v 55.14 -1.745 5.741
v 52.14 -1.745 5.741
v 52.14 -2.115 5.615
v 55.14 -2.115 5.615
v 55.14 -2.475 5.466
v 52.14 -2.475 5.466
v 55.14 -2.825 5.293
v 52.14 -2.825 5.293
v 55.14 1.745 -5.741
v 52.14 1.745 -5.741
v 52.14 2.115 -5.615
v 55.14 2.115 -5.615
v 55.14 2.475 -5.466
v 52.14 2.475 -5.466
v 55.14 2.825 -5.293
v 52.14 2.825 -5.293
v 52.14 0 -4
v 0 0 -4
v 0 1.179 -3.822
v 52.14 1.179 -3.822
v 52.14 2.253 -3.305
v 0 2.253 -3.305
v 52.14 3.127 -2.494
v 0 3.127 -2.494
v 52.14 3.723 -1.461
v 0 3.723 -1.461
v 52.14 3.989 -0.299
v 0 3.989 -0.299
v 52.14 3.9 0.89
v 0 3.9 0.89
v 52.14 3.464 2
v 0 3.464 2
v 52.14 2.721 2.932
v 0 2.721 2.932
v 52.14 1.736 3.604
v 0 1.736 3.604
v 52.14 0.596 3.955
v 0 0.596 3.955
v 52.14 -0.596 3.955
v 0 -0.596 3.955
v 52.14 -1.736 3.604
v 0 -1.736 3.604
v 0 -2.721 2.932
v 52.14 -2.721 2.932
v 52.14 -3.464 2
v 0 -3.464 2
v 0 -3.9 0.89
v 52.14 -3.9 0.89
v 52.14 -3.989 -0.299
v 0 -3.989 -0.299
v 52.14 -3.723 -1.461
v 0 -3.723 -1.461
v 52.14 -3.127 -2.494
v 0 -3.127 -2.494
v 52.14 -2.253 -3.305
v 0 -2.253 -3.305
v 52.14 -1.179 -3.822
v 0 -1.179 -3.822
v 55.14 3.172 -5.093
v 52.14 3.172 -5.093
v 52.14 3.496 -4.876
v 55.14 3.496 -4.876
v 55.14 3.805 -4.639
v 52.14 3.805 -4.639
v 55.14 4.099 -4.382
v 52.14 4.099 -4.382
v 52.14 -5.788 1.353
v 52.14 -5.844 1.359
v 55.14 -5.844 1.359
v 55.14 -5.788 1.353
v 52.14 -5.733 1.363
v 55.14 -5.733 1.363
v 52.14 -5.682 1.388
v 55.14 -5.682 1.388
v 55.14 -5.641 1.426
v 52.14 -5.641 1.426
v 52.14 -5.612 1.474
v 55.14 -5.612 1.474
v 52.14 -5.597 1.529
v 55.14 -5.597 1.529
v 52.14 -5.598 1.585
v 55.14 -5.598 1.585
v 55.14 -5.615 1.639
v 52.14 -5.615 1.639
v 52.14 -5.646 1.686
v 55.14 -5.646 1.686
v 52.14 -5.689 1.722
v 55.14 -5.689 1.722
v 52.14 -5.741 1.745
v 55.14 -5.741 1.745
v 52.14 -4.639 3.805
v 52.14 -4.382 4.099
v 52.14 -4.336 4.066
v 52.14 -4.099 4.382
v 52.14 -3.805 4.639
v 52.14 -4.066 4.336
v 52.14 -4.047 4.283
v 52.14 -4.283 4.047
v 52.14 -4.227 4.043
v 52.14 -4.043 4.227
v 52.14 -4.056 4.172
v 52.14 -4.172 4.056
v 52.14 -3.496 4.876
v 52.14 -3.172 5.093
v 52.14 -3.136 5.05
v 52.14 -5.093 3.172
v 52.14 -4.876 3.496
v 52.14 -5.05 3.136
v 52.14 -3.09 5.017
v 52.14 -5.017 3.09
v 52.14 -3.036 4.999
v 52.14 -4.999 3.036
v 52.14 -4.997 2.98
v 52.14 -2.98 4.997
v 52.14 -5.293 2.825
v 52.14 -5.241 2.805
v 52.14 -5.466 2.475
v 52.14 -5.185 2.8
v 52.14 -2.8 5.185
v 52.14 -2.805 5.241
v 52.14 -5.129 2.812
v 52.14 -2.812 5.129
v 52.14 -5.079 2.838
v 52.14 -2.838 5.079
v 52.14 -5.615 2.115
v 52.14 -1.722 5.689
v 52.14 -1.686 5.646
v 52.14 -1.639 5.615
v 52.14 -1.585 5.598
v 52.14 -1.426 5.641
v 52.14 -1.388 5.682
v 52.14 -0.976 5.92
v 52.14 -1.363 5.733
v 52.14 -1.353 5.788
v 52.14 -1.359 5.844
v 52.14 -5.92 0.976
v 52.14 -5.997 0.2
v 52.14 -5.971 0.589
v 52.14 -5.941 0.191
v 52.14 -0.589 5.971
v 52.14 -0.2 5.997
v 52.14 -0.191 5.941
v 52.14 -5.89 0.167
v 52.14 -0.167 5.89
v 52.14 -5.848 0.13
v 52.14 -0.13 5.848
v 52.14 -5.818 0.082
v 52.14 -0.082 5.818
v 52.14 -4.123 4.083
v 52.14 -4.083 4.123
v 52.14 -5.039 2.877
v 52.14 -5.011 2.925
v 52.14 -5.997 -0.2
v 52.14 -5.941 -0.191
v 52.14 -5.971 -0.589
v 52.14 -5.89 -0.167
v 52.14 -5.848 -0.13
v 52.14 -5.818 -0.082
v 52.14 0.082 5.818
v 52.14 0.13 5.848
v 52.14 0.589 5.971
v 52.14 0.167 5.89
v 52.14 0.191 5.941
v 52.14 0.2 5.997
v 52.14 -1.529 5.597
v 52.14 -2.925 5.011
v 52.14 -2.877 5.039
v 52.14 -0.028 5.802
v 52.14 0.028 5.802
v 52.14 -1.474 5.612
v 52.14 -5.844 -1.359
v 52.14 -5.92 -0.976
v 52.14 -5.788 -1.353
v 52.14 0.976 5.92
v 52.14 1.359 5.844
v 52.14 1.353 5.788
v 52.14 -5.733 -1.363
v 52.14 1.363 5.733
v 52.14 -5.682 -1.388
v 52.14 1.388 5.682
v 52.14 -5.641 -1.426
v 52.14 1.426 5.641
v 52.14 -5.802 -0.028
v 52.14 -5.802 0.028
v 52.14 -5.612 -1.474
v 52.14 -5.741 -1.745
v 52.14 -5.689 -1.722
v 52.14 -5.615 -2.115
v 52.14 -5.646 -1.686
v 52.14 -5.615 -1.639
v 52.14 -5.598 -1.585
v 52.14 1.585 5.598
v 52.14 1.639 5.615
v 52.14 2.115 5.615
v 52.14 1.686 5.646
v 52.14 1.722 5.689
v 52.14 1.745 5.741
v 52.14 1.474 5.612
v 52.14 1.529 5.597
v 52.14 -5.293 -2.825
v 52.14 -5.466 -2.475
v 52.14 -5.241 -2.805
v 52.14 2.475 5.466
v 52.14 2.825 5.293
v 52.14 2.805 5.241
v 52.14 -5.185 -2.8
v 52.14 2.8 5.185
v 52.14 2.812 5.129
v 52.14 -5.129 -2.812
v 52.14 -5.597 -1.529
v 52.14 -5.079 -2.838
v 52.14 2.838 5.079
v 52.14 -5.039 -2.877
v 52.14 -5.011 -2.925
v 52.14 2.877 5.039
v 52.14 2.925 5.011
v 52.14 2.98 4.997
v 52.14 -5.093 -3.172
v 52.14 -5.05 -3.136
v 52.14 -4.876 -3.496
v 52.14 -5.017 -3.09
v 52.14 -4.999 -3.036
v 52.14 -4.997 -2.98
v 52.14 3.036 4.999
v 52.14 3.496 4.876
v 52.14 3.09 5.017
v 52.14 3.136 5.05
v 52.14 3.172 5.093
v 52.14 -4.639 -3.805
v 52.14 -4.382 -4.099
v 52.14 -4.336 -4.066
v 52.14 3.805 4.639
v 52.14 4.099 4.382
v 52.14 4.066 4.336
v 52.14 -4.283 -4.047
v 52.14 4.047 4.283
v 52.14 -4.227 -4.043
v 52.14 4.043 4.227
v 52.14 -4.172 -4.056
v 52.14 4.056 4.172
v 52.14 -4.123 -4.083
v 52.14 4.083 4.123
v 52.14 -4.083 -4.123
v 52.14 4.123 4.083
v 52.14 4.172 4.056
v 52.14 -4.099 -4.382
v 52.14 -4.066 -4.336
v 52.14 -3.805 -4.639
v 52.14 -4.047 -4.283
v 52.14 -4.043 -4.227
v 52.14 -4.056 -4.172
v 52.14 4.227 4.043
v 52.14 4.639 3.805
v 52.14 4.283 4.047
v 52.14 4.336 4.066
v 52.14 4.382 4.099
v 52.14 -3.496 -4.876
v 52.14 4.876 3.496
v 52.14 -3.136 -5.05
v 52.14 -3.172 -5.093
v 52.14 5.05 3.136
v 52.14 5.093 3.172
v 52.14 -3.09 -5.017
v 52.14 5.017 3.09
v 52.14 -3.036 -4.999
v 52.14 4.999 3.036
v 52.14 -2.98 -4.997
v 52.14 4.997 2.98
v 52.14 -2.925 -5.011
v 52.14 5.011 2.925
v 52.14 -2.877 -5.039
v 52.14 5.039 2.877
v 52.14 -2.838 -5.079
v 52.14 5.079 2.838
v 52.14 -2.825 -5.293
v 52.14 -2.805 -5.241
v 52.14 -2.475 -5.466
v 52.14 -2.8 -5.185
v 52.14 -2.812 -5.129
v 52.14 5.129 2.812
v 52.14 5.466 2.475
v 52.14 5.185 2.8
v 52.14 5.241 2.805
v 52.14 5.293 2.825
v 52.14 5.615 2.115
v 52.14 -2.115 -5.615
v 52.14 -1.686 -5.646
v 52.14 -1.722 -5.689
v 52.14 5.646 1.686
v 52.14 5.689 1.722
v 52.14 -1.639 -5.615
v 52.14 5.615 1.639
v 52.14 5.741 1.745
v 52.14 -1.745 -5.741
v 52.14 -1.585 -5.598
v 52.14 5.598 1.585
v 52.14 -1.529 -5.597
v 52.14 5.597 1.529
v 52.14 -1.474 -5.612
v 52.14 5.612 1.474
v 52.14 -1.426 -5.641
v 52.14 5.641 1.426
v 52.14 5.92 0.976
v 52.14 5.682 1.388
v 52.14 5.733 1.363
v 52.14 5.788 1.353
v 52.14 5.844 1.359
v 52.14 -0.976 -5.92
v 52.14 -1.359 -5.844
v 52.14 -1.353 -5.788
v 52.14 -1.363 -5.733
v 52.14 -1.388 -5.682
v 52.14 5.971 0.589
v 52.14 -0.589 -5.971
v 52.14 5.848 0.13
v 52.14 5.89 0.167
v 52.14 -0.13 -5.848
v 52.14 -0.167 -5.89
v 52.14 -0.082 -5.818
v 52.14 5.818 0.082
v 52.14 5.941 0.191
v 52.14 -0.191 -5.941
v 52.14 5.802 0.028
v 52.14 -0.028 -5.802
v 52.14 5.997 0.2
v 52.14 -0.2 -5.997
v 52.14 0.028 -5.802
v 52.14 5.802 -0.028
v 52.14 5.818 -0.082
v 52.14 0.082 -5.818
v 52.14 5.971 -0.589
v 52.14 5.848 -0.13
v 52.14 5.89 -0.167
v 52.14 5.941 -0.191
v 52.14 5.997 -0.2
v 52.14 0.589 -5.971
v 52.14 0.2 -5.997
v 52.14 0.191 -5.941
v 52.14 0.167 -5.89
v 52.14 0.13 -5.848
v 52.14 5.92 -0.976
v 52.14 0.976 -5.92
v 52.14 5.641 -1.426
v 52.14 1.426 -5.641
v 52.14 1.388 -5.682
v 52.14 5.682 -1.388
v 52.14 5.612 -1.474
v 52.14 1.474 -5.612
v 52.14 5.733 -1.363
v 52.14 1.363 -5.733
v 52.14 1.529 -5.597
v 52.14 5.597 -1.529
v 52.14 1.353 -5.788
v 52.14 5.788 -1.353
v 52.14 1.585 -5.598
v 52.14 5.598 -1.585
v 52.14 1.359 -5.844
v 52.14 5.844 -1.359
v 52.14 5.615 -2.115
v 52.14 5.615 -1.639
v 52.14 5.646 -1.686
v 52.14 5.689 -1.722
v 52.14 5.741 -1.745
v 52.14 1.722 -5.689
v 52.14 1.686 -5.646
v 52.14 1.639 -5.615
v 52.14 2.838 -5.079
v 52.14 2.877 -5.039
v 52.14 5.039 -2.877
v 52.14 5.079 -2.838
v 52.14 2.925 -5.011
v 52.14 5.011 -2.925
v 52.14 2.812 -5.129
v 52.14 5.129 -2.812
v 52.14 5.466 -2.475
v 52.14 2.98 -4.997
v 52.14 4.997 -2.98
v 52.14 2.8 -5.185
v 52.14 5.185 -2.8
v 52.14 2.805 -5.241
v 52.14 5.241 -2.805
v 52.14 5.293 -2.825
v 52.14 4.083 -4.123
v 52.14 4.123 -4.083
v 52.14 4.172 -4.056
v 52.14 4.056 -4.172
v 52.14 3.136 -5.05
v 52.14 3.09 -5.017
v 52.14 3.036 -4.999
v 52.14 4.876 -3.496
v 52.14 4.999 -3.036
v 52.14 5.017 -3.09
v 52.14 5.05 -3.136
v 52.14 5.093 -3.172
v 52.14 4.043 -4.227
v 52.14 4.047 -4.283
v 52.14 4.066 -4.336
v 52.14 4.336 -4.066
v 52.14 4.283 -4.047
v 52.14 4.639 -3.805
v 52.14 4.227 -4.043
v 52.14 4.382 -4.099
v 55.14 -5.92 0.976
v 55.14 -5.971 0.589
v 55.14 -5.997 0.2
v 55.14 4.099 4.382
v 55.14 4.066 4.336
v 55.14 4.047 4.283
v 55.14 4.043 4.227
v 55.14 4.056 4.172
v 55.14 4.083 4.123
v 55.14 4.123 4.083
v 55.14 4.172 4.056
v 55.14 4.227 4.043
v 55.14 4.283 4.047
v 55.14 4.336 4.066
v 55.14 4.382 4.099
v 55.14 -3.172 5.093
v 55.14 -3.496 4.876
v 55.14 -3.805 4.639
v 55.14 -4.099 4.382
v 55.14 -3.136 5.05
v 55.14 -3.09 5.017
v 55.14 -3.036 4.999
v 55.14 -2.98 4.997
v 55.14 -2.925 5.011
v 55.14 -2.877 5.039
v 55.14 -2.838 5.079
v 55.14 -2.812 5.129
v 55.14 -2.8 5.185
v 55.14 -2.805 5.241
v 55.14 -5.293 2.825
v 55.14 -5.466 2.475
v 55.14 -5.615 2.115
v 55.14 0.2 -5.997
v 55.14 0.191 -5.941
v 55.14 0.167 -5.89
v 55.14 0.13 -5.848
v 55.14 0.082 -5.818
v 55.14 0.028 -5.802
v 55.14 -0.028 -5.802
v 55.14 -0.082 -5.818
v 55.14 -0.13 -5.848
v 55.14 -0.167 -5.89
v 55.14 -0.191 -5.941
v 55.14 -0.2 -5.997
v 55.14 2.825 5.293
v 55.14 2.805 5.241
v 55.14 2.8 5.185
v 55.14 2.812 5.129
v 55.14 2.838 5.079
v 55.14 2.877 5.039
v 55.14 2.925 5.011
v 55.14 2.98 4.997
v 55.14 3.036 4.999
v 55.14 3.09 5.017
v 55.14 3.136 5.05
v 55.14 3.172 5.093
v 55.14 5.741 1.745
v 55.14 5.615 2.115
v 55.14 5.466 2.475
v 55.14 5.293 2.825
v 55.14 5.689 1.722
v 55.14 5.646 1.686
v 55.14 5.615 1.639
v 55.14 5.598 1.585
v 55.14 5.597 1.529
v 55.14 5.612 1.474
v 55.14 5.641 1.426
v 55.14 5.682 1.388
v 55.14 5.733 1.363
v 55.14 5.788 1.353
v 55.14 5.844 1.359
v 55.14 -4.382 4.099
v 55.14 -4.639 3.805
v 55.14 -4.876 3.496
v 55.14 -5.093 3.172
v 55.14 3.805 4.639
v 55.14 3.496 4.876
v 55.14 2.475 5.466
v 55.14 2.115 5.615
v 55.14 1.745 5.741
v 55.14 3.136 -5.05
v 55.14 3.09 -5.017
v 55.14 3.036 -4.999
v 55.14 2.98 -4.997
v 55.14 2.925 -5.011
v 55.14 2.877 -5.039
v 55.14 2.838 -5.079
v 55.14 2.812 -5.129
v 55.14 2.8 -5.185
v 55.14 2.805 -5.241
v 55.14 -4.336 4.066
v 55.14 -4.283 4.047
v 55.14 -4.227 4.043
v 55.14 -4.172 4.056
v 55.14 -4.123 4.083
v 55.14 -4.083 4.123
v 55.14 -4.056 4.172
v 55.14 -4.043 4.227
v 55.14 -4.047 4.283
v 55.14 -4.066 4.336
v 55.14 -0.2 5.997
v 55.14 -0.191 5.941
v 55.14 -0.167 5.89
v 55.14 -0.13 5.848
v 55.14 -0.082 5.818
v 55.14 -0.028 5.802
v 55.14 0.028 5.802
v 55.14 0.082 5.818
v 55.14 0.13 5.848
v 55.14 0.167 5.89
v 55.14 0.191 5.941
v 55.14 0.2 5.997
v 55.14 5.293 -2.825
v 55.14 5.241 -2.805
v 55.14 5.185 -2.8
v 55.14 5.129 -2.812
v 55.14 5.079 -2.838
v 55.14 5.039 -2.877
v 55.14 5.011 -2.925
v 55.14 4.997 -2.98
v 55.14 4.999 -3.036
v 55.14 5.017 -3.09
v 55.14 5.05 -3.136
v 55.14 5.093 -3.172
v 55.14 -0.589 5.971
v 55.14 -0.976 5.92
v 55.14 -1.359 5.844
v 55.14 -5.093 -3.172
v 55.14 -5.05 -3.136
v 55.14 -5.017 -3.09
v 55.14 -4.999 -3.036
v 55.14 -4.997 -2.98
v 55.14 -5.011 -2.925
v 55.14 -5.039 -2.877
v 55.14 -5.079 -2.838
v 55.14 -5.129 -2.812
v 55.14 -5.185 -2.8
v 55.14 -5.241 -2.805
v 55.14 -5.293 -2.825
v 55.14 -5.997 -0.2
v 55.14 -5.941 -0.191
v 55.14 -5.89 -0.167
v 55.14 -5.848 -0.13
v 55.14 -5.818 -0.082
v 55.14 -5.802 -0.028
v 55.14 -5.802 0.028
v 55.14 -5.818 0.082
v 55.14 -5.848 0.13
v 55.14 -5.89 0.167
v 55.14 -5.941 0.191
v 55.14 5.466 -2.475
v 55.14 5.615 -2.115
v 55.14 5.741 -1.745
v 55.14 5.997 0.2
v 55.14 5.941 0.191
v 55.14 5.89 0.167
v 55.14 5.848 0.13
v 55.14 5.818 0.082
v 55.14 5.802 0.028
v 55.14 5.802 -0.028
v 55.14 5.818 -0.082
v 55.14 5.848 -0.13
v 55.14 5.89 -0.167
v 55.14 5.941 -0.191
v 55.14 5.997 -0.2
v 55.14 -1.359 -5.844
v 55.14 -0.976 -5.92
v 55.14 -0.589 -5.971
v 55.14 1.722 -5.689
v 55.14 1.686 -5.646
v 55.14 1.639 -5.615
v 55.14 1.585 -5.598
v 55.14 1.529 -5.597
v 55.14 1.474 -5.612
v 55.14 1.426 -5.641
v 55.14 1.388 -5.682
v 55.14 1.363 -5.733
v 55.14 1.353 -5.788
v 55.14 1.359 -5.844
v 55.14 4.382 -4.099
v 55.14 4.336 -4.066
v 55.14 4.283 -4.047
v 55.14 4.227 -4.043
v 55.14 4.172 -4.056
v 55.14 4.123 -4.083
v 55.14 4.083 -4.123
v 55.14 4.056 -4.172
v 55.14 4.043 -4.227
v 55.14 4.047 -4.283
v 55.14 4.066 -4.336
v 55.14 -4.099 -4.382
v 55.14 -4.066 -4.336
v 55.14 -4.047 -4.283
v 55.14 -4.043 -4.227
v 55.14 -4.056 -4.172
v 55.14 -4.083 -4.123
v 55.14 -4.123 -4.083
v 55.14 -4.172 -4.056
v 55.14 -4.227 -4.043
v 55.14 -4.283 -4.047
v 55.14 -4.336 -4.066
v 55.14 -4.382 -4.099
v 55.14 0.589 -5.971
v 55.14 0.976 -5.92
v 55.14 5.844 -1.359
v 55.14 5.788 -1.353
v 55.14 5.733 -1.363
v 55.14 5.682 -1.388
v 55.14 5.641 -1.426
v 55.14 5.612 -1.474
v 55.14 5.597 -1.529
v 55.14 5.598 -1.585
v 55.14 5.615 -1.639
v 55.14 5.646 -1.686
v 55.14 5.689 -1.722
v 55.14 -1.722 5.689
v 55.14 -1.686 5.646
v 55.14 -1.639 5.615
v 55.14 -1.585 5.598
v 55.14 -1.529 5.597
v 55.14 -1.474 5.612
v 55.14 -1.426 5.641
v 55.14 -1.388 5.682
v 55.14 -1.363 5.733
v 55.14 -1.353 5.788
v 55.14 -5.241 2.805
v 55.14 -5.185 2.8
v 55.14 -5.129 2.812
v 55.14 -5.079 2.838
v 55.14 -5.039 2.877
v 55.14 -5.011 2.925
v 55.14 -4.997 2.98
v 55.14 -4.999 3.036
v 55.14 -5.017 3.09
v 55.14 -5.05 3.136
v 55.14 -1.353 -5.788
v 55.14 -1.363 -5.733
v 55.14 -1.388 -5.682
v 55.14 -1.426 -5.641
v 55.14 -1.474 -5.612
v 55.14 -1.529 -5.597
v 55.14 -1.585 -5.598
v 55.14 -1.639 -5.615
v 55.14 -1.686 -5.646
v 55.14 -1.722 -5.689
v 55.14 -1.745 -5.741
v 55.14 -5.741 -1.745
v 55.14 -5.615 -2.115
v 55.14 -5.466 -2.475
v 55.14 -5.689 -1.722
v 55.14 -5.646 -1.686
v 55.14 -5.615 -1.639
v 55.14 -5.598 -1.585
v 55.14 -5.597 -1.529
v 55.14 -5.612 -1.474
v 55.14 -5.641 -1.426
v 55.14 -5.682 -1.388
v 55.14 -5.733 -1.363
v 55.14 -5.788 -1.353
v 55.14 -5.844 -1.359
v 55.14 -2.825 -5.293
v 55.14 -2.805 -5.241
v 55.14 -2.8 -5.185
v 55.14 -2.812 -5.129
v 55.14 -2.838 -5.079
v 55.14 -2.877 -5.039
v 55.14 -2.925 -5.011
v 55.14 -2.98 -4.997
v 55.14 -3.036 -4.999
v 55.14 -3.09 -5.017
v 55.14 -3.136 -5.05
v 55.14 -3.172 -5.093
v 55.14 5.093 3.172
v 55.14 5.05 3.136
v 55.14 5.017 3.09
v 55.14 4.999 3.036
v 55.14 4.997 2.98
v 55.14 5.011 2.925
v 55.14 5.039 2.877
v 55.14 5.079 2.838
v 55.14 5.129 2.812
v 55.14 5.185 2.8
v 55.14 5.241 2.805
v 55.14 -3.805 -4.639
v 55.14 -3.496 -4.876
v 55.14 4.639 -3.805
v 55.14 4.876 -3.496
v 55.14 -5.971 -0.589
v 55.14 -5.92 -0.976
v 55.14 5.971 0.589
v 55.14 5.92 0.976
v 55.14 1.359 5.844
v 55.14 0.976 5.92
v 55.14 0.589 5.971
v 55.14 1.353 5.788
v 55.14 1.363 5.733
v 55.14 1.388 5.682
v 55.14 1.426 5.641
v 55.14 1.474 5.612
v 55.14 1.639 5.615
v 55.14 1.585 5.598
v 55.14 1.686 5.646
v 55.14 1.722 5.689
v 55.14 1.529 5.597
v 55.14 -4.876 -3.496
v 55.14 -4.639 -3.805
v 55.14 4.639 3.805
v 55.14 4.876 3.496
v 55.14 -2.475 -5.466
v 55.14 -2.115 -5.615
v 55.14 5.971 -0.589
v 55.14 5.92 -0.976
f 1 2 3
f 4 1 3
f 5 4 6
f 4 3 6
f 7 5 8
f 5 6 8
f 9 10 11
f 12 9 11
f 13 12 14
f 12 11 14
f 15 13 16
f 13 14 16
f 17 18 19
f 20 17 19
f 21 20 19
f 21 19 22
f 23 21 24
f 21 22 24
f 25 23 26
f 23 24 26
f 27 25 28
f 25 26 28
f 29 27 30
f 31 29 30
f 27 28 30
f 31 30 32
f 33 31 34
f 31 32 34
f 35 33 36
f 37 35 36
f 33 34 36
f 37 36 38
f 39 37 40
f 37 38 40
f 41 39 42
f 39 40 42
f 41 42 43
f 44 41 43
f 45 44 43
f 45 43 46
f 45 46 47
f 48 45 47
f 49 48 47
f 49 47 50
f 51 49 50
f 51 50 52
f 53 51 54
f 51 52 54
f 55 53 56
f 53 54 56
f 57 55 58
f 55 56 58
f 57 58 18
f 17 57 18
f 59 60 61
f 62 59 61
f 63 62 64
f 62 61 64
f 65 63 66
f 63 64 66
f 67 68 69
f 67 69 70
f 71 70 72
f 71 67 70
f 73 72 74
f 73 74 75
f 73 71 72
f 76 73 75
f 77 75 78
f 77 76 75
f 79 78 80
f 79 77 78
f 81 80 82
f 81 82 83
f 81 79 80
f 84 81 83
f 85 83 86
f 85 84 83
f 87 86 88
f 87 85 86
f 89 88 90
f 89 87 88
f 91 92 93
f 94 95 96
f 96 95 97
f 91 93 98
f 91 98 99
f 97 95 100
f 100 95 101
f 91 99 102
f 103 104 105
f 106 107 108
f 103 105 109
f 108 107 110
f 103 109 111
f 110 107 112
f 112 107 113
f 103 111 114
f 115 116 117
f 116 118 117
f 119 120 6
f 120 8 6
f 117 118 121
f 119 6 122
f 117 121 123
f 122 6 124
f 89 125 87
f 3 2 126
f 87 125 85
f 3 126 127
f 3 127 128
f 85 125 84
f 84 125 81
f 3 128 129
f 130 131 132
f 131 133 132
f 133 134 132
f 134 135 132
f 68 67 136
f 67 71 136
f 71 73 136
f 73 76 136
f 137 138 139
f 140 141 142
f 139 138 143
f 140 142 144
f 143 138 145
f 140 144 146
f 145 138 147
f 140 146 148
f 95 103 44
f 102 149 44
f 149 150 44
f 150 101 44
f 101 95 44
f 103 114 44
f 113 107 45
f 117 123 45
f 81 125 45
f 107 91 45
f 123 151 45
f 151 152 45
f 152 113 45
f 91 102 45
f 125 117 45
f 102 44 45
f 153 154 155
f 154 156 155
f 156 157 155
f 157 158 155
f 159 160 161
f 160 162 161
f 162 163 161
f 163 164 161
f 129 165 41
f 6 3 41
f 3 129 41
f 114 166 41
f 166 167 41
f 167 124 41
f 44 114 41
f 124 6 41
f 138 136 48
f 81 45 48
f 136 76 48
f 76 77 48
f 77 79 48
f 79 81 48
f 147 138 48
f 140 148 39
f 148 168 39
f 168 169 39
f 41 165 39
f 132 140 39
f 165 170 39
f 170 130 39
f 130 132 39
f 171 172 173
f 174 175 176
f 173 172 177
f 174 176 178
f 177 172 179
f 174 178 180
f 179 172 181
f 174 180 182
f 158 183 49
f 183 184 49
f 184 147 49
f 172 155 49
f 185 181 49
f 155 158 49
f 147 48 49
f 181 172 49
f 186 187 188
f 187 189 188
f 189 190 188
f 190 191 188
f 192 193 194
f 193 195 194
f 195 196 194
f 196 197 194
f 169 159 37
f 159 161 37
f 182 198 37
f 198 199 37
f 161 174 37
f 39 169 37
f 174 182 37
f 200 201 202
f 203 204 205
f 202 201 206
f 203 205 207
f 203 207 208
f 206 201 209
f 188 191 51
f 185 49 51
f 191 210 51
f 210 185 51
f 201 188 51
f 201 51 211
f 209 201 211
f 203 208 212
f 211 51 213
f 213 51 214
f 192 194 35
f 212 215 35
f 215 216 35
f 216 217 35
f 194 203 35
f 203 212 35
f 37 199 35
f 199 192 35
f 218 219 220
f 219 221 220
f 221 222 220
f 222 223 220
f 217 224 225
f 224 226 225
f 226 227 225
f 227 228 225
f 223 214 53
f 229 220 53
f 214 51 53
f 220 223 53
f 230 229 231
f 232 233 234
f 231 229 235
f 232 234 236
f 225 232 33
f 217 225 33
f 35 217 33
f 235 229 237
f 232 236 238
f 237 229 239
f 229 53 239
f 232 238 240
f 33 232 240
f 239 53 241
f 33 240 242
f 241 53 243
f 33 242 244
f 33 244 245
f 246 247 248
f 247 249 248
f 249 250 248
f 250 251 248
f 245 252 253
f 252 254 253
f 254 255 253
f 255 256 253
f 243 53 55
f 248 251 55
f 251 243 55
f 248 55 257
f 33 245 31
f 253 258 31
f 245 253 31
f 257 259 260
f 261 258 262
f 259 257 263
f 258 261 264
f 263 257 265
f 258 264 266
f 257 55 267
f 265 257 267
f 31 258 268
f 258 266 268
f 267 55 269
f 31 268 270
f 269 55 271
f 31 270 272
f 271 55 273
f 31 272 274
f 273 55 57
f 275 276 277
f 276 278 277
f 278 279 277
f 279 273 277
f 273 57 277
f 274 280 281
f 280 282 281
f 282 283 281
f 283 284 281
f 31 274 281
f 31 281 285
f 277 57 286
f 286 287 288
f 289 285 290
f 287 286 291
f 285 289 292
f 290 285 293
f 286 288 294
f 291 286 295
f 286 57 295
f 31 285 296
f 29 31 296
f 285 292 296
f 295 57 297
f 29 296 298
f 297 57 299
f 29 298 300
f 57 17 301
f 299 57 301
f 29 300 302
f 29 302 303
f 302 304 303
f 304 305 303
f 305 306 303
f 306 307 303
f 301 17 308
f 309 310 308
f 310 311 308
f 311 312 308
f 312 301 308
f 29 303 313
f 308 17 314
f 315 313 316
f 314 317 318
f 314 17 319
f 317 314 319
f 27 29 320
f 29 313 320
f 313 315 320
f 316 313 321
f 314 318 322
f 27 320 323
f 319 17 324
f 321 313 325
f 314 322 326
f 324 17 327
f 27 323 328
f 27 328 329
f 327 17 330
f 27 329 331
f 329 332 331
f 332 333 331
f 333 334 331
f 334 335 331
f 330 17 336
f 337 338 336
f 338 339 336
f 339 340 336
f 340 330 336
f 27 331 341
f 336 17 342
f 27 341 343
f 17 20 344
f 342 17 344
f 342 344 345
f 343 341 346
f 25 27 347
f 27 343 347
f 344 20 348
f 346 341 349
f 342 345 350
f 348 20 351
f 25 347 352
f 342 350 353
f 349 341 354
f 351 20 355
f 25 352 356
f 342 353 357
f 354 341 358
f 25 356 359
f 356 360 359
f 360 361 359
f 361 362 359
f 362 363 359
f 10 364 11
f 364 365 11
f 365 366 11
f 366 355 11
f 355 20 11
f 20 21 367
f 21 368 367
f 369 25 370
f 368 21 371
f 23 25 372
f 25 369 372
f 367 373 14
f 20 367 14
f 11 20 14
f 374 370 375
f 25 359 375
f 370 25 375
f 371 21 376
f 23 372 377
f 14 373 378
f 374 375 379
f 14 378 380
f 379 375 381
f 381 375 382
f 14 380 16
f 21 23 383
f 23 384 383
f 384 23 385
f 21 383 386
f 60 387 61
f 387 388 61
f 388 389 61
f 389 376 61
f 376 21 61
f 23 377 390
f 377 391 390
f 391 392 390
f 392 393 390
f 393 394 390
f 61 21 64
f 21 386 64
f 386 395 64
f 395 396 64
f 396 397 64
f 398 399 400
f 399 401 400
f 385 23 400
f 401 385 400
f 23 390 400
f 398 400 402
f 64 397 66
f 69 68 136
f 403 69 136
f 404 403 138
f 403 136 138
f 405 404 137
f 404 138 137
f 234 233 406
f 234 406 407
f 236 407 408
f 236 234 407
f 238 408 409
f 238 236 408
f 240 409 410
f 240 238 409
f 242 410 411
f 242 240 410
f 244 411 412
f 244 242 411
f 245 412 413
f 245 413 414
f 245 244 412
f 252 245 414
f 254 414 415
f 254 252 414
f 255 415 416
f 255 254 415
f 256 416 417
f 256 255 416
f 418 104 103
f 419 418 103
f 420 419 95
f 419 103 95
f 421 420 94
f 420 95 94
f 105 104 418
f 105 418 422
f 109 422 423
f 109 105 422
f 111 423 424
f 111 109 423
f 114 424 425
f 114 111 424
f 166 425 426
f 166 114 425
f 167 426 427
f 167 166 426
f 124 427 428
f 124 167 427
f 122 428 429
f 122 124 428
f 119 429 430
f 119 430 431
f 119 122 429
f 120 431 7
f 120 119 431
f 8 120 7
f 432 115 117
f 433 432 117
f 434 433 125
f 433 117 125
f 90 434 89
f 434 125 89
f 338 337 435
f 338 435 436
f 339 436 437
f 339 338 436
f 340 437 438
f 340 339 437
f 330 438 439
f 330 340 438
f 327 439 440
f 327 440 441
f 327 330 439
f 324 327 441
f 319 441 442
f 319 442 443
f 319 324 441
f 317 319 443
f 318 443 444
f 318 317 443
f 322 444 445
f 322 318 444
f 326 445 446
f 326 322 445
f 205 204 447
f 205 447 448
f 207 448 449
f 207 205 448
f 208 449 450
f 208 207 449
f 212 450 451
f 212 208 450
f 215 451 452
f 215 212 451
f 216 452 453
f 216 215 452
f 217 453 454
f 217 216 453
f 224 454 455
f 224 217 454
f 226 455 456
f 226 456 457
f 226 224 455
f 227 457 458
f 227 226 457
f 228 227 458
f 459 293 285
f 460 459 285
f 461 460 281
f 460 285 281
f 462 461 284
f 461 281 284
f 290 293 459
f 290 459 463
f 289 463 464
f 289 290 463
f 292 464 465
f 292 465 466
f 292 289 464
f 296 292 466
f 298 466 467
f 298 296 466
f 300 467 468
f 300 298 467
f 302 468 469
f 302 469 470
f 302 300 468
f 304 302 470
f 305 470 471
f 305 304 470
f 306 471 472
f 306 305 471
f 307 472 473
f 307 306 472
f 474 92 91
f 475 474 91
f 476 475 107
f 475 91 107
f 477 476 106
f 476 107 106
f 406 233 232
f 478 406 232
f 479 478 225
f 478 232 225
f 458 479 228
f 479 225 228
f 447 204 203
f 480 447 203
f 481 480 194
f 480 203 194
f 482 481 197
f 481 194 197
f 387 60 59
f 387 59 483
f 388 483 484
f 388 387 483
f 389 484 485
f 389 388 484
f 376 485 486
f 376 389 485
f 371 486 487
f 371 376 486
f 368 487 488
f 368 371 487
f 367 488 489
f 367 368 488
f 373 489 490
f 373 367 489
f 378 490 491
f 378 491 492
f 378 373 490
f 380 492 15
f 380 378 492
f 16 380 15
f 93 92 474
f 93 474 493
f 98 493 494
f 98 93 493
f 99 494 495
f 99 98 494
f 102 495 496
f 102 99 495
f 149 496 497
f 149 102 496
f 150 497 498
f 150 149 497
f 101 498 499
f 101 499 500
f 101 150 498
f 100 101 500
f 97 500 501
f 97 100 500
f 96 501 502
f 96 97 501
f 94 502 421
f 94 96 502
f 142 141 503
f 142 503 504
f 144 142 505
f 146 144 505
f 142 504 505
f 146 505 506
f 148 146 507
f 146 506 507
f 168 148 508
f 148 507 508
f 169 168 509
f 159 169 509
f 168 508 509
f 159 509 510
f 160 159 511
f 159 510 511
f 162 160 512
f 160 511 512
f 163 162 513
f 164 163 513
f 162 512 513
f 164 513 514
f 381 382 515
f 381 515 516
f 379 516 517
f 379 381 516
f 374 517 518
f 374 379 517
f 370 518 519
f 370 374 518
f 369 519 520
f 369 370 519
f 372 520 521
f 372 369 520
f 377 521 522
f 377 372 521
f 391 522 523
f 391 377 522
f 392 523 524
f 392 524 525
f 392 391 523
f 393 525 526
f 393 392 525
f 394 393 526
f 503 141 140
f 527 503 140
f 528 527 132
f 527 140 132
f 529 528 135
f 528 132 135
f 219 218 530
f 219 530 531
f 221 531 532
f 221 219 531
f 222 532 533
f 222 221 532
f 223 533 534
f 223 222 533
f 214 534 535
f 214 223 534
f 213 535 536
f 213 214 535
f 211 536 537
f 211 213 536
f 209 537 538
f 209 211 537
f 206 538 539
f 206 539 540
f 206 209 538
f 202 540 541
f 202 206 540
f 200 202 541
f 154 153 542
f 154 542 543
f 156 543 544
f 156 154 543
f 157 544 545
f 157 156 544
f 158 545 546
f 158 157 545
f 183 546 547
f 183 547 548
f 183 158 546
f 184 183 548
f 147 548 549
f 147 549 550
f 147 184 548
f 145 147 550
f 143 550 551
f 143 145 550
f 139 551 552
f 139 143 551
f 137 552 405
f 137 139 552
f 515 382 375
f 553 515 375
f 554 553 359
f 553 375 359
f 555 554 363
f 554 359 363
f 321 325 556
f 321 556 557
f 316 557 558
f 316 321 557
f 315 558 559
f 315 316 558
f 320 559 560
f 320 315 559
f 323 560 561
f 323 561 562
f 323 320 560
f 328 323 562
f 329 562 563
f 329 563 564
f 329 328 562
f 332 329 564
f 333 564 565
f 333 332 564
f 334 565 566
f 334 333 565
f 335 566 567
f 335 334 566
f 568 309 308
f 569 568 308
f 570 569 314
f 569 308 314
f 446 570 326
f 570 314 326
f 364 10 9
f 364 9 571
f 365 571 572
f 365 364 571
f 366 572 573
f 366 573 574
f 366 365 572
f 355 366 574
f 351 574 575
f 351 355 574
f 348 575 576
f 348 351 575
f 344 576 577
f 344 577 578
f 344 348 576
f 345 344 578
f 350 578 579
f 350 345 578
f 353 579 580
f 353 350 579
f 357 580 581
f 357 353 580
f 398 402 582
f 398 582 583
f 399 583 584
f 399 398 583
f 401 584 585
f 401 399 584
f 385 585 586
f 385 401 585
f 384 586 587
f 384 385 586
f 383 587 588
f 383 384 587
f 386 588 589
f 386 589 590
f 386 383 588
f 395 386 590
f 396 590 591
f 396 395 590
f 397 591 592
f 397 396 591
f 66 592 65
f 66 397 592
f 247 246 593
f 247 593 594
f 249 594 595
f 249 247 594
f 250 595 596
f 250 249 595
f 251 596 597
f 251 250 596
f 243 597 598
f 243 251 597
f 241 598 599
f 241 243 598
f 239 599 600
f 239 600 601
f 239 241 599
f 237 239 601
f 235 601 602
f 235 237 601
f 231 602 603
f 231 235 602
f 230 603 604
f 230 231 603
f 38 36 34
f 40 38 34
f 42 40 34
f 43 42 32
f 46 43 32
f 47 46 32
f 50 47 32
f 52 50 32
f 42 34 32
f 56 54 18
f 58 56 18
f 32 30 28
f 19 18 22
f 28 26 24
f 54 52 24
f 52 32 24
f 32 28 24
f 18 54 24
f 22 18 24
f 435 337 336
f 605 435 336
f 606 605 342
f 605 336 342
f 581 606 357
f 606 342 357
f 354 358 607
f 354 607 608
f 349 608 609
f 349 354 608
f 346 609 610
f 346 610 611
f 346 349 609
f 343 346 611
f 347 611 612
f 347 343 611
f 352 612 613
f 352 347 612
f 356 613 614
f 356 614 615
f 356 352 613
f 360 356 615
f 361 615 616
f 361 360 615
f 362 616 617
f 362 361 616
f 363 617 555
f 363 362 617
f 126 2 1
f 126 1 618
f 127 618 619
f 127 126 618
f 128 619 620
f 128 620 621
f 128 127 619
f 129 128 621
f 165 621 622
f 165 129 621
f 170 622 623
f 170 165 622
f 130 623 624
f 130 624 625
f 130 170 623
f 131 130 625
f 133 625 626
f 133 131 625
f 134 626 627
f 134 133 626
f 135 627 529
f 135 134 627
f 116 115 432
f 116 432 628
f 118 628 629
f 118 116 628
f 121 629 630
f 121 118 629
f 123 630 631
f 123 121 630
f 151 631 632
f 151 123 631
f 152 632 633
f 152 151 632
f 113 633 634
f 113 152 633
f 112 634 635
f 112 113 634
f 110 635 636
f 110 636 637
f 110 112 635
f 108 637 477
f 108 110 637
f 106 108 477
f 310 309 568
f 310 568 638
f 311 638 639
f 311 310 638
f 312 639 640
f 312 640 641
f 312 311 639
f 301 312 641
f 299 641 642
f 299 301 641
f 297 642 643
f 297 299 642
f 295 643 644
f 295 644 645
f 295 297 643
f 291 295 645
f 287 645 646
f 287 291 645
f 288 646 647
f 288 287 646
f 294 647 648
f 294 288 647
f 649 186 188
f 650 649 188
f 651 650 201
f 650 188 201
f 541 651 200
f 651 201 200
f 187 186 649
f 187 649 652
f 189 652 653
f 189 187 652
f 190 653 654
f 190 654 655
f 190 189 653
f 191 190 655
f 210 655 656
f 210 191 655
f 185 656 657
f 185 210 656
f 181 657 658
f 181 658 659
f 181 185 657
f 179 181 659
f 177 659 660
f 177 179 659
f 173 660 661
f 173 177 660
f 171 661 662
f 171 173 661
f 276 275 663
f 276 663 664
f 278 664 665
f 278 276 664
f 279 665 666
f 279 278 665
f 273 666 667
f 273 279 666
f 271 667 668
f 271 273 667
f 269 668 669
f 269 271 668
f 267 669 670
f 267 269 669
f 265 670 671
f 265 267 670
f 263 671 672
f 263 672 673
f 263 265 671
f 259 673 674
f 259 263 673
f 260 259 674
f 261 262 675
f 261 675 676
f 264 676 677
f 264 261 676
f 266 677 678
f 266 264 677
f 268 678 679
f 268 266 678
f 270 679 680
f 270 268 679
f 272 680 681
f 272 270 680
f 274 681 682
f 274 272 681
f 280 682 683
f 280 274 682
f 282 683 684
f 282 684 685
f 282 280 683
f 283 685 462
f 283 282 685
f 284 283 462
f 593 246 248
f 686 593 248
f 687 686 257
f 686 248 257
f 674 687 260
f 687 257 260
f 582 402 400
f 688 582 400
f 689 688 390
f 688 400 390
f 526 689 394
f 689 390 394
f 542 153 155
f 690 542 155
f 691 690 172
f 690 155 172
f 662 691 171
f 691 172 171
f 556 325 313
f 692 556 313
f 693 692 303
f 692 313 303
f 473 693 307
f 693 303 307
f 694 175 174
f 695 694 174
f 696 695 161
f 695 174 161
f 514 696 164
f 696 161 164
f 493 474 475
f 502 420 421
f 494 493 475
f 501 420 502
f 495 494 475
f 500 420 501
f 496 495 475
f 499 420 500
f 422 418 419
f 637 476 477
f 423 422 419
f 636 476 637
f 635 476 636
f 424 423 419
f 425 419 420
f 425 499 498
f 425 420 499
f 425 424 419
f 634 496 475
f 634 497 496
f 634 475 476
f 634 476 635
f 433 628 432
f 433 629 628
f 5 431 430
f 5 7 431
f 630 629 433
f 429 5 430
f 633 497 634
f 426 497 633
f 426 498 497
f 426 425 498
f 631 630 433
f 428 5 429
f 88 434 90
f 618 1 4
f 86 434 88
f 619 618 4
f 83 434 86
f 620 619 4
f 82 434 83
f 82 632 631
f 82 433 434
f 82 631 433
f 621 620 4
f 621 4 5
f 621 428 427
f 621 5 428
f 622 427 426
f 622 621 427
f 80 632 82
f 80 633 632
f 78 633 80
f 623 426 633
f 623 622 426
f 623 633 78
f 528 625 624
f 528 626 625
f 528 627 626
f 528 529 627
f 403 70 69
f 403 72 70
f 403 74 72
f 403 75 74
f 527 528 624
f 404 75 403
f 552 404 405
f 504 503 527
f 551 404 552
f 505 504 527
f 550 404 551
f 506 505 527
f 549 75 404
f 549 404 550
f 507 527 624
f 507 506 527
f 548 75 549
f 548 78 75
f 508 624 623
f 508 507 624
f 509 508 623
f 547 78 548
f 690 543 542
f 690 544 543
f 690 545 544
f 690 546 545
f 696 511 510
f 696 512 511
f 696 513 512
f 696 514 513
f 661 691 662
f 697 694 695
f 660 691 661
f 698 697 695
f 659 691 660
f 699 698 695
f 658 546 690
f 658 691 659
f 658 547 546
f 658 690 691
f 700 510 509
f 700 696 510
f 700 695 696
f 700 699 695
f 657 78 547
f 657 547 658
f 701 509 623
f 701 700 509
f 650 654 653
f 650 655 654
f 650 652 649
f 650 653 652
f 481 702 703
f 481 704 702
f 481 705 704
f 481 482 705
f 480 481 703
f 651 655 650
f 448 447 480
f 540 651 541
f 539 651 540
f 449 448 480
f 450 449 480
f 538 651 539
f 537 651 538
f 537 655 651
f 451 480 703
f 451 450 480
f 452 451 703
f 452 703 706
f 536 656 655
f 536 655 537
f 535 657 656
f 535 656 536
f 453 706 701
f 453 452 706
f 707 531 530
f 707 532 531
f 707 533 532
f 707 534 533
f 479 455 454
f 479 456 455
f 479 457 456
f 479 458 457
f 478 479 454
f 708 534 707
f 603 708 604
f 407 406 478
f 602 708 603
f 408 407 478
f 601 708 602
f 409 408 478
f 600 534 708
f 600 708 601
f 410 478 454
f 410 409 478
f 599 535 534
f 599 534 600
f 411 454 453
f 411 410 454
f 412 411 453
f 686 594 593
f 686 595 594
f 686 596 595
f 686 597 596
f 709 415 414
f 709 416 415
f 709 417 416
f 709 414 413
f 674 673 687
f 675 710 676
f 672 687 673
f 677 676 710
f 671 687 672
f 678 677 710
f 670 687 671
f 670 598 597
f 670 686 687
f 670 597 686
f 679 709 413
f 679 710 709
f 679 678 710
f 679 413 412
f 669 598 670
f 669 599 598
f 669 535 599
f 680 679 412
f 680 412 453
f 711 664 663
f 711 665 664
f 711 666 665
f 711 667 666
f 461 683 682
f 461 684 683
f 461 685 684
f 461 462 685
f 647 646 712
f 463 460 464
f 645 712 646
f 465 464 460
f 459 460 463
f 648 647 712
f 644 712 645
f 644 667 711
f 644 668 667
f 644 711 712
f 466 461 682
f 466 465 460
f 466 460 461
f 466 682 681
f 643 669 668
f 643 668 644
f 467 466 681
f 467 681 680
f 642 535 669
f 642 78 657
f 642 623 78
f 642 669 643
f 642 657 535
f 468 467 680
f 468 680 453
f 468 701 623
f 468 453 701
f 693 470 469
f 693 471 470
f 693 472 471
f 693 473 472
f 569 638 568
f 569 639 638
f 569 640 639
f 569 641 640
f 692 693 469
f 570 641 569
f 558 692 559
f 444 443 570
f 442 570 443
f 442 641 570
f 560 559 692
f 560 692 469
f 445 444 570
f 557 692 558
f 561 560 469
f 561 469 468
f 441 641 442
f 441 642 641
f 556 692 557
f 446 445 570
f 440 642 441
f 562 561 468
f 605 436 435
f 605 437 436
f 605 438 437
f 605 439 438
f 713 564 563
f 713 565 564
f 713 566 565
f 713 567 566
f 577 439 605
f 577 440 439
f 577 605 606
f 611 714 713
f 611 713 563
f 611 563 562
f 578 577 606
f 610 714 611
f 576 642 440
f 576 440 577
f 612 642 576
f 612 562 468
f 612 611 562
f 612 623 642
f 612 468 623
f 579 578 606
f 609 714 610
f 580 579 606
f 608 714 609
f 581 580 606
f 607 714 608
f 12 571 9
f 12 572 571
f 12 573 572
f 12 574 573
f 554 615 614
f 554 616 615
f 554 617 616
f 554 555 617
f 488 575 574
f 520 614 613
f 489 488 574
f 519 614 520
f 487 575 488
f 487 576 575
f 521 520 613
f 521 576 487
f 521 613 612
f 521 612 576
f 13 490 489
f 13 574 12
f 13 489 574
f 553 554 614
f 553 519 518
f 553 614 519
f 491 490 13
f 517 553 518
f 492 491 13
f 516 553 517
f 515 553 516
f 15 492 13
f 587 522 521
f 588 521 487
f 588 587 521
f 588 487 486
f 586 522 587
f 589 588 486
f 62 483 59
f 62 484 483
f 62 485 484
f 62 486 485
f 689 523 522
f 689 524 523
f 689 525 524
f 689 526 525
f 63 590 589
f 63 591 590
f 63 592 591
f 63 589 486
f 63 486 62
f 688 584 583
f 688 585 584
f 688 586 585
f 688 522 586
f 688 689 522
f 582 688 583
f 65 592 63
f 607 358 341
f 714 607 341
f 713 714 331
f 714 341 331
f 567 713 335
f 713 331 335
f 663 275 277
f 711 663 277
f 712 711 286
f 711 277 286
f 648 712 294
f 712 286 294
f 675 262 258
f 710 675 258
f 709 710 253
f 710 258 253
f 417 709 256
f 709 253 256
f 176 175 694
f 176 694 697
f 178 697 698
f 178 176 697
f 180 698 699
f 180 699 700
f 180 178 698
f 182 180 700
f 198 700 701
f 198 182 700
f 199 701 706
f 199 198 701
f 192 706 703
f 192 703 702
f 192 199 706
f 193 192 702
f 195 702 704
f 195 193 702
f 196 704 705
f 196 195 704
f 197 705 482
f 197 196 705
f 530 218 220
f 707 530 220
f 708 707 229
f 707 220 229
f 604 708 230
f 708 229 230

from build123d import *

# Parameters (mm, degrees)
SKETCH1_R           = 4
BOSS_EXTRUDE1_DEPTH = 52.14
SKETCH2_R           = 6
BOSS_EXTRUDE2_DEPTH = 3
SKETCH3_R           = 0.2
CUT_EXTRUDE1_DEPTH  = 3
CIRPATTERN1_START   = 52.14
CIRPATTERN1_DEPTH   = 3


# Read off the part's stored shape, not the designer's step: CirPattern1
with BuildPart() as part:
    # Sketch1 → Boss-Extrude1 (new body)
    with BuildSketch(Plane(origin=(0, 0, 0), x_dir=(0, 0, -1), z_dir=(1, 0, 0))):
        Circle(SKETCH1_R)
    extrude(amount=BOSS_EXTRUDE1_DEPTH)

    # Sketch2 → Boss-Extrude2 (add)
    with BuildSketch(Plane(origin=(52.14, 0, 0), x_dir=(0, 0, -1), z_dir=(1, 0, 0))):
        Circle(SKETCH2_R)
    extrude(amount=BOSS_EXTRUDE2_DEPTH)

    # Sketch3 → Cut-Extrude1 (cut)
    with BuildSketch(Plane(origin=(55.14, 0, 0), x_dir=(0, 0, -1), z_dir=(1, 0, 0))):
        with Locations((-6, 0)):
            Circle(SKETCH3_R)
    extrude(amount=-CUT_EXTRUDE1_DEPTH, mode=Mode.SUBTRACT)

    # CirPattern1 outline → CirPattern1 (cut)
    with BuildSketch(Plane.YZ.offset(CIRPATTERN1_START)):
        with BuildLine():
            ThreePointArc((-1.358893208, 5.844091824), (-1.552914271, 5.795554958), (-1.745209873, 5.740578586))
            ThreePointArc((-1.745209873, 5.740578586), (-1.501150462, 5.602369792), (-1.358893208, 5.844091824))
        make_face()
        with BuildLine():
            ThreePointArc((1.358893208, 5.844091824), (1.501150462, 5.602369792), (1.745209873, 5.740578586))
            ThreePointArc((1.745209873, 5.740578586), (1.552914271, 5.795554958), (1.358893208, 5.844091824))
        make_face()
        with BuildLine():
            ThreePointArc((2.825152311, 5.293251782), (2.9, 5.022947342), (3.171514356, 5.093279561))
            ThreePointArc((3.171514356, 5.093279561), (3, 5.196152423), (2.825152311, 5.293251782))
        make_face()
        with BuildLine():
            ThreePointArc((4.098881951, 4.381685378), (4.101219331, 4.101219331), (4.381685378, 4.098881951))
            ThreePointArc((4.381685378, 4.098881951), (4.242640687, 4.242640687), (4.098881951, 4.381685378))
        make_face()
        with BuildLine():
            ThreePointArc((5.093279561, 3.171514356), (5.022947342, 2.9), (5.293251782, 2.825152311))
            ThreePointArc((5.293251782, 2.825152311), (5.196152423, 3), (5.093279561, 3.171514356))
        make_face()
        with BuildLine():
            ThreePointArc((5.740578586, 1.745209873), (5.602369792, 1.501150462), (5.844091824, 1.358893208))
            ThreePointArc((5.844091824, 1.358893208), (5.795554958, 1.552914271), (5.740578586, 1.745209873))
        make_face()
        with BuildLine():
            ThreePointArc((5.996666667, 0.19997222), (5.8, 0), (5.996666667, -0.19997222))
            ThreePointArc((5.996666667, -0.19997222), (6, 0), (5.996666667, 0.19997222))
        make_face()
        with BuildLine():
            ThreePointArc((5.844091824, -1.358893208), (5.602369792, -1.501150462), (5.740578586, -1.745209873))
            ThreePointArc((5.740578586, -1.745209873), (5.795554958, -1.552914271), (5.844091824, -1.358893208))
        make_face()
        with BuildLine():
            ThreePointArc((5.293251782, -2.825152311), (5.022947342, -2.9), (5.093279561, -3.171514356))
            ThreePointArc((5.093279561, -3.171514356), (5.196152423, -3), (5.293251782, -2.825152311))
        make_face()
        with BuildLine():
            ThreePointArc((4.381685378, -4.098881951), (4.101219331, -4.101219331), (4.098881951, -4.381685378))
            ThreePointArc((4.098881951, -4.381685378), (4.242640687, -4.242640687), (4.381685378, -4.098881951))
        make_face()
        with BuildLine():
            ThreePointArc((3.171514356, -5.093279561), (2.9, -5.022947342), (2.825152311, -5.293251782))
            ThreePointArc((2.825152311, -5.293251782), (3, -5.196152423), (3.171514356, -5.093279561))
        make_face()
        with BuildLine():
            ThreePointArc((1.745209873, -5.740578586), (1.501150462, -5.602369792), (1.358893208, -5.844091824))
            ThreePointArc((1.358893208, -5.844091824), (1.552914271, -5.795554958), (1.745209873, -5.740578586))
        make_face()
        with BuildLine():
            ThreePointArc((0.19997222, -5.996666667), (0, -5.8), (-0.19997222, -5.996666667))
            ThreePointArc((-0.19997222, -5.996666667), (0, -6), (0.19997222, -5.996666667))
        make_face()
        with BuildLine():
            ThreePointArc((-1.358893208, -5.844091824), (-1.501150462, -5.602369792), (-1.745209873, -5.740578586))
            ThreePointArc((-1.745209873, -5.740578586), (-1.552914271, -5.795554958), (-1.358893208, -5.844091824))
        make_face()
        with BuildLine():
            ThreePointArc((-2.825152311, -5.293251782), (-2.9, -5.022947342), (-3.171514356, -5.093279561))
            ThreePointArc((-3.171514356, -5.093279561), (-3, -5.196152423), (-2.825152311, -5.293251782))
        make_face()
        with BuildLine():
            ThreePointArc((-4.098881951, -4.381685378), (-4.101219331, -4.101219331), (-4.381685378, -4.098881951))
            ThreePointArc((-4.381685378, -4.098881951), (-4.242640687, -4.242640687), (-4.098881951, -4.381685378))
        make_face()
        with BuildLine():
            ThreePointArc((-5.093279561, -3.171514356), (-5.022947342, -2.9), (-5.293251782, -2.825152311))
            ThreePointArc((-5.293251782, -2.825152311), (-5.196152423, -3), (-5.093279561, -3.171514356))
        make_face()
        with BuildLine():
            ThreePointArc((-5.740578586, -1.745209873), (-5.602369792, -1.501150462), (-5.844091824, -1.358893208))
            ThreePointArc((-5.844091824, -1.358893208), (-5.795554958, -1.552914271), (-5.740578586, -1.745209873))
        make_face()
        with BuildLine():
            ThreePointArc((-5.996666667, -0.19997222), (-5.8, 0), (-5.996666667, 0.19997222))
            ThreePointArc((-5.996666667, 0.19997222), (-6, 0), (-5.996666667, -0.19997222))
        make_face()
        with BuildLine():
            ThreePointArc((-5.844091824, 1.358893208), (-5.602369792, 1.501150462), (-5.740578586, 1.745209873))
            ThreePointArc((-5.740578586, 1.745209873), (-5.795554958, 1.552914271), (-5.844091824, 1.358893208))
        make_face()
        with BuildLine():
            ThreePointArc((-5.293251782, 2.825152311), (-5.022947342, 2.9), (-5.093279561, 3.171514356))
            ThreePointArc((-5.093279561, 3.171514356), (-5.196152423, 3), (-5.293251782, 2.825152311))
        make_face()
        with BuildLine():
            ThreePointArc((-4.381685378, 4.098881951), (-4.101219331, 4.101219331), (-4.098881951, 4.381685378))
            ThreePointArc((-4.098881951, 4.381685378), (-4.242640687, 4.242640687), (-4.381685378, 4.098881951))
        make_face()
        with BuildLine():
            ThreePointArc((-3.171514356, 5.093279561), (-2.9, 5.022947342), (-2.825152311, 5.293251782))
            ThreePointArc((-2.825152311, 5.293251782), (-3, 5.196152423), (-3.171514356, 5.093279561))
        make_face()
    extrude(amount=CIRPATTERN1_DEPTH, mode=Mode.SUBTRACT)


solid = part.part
